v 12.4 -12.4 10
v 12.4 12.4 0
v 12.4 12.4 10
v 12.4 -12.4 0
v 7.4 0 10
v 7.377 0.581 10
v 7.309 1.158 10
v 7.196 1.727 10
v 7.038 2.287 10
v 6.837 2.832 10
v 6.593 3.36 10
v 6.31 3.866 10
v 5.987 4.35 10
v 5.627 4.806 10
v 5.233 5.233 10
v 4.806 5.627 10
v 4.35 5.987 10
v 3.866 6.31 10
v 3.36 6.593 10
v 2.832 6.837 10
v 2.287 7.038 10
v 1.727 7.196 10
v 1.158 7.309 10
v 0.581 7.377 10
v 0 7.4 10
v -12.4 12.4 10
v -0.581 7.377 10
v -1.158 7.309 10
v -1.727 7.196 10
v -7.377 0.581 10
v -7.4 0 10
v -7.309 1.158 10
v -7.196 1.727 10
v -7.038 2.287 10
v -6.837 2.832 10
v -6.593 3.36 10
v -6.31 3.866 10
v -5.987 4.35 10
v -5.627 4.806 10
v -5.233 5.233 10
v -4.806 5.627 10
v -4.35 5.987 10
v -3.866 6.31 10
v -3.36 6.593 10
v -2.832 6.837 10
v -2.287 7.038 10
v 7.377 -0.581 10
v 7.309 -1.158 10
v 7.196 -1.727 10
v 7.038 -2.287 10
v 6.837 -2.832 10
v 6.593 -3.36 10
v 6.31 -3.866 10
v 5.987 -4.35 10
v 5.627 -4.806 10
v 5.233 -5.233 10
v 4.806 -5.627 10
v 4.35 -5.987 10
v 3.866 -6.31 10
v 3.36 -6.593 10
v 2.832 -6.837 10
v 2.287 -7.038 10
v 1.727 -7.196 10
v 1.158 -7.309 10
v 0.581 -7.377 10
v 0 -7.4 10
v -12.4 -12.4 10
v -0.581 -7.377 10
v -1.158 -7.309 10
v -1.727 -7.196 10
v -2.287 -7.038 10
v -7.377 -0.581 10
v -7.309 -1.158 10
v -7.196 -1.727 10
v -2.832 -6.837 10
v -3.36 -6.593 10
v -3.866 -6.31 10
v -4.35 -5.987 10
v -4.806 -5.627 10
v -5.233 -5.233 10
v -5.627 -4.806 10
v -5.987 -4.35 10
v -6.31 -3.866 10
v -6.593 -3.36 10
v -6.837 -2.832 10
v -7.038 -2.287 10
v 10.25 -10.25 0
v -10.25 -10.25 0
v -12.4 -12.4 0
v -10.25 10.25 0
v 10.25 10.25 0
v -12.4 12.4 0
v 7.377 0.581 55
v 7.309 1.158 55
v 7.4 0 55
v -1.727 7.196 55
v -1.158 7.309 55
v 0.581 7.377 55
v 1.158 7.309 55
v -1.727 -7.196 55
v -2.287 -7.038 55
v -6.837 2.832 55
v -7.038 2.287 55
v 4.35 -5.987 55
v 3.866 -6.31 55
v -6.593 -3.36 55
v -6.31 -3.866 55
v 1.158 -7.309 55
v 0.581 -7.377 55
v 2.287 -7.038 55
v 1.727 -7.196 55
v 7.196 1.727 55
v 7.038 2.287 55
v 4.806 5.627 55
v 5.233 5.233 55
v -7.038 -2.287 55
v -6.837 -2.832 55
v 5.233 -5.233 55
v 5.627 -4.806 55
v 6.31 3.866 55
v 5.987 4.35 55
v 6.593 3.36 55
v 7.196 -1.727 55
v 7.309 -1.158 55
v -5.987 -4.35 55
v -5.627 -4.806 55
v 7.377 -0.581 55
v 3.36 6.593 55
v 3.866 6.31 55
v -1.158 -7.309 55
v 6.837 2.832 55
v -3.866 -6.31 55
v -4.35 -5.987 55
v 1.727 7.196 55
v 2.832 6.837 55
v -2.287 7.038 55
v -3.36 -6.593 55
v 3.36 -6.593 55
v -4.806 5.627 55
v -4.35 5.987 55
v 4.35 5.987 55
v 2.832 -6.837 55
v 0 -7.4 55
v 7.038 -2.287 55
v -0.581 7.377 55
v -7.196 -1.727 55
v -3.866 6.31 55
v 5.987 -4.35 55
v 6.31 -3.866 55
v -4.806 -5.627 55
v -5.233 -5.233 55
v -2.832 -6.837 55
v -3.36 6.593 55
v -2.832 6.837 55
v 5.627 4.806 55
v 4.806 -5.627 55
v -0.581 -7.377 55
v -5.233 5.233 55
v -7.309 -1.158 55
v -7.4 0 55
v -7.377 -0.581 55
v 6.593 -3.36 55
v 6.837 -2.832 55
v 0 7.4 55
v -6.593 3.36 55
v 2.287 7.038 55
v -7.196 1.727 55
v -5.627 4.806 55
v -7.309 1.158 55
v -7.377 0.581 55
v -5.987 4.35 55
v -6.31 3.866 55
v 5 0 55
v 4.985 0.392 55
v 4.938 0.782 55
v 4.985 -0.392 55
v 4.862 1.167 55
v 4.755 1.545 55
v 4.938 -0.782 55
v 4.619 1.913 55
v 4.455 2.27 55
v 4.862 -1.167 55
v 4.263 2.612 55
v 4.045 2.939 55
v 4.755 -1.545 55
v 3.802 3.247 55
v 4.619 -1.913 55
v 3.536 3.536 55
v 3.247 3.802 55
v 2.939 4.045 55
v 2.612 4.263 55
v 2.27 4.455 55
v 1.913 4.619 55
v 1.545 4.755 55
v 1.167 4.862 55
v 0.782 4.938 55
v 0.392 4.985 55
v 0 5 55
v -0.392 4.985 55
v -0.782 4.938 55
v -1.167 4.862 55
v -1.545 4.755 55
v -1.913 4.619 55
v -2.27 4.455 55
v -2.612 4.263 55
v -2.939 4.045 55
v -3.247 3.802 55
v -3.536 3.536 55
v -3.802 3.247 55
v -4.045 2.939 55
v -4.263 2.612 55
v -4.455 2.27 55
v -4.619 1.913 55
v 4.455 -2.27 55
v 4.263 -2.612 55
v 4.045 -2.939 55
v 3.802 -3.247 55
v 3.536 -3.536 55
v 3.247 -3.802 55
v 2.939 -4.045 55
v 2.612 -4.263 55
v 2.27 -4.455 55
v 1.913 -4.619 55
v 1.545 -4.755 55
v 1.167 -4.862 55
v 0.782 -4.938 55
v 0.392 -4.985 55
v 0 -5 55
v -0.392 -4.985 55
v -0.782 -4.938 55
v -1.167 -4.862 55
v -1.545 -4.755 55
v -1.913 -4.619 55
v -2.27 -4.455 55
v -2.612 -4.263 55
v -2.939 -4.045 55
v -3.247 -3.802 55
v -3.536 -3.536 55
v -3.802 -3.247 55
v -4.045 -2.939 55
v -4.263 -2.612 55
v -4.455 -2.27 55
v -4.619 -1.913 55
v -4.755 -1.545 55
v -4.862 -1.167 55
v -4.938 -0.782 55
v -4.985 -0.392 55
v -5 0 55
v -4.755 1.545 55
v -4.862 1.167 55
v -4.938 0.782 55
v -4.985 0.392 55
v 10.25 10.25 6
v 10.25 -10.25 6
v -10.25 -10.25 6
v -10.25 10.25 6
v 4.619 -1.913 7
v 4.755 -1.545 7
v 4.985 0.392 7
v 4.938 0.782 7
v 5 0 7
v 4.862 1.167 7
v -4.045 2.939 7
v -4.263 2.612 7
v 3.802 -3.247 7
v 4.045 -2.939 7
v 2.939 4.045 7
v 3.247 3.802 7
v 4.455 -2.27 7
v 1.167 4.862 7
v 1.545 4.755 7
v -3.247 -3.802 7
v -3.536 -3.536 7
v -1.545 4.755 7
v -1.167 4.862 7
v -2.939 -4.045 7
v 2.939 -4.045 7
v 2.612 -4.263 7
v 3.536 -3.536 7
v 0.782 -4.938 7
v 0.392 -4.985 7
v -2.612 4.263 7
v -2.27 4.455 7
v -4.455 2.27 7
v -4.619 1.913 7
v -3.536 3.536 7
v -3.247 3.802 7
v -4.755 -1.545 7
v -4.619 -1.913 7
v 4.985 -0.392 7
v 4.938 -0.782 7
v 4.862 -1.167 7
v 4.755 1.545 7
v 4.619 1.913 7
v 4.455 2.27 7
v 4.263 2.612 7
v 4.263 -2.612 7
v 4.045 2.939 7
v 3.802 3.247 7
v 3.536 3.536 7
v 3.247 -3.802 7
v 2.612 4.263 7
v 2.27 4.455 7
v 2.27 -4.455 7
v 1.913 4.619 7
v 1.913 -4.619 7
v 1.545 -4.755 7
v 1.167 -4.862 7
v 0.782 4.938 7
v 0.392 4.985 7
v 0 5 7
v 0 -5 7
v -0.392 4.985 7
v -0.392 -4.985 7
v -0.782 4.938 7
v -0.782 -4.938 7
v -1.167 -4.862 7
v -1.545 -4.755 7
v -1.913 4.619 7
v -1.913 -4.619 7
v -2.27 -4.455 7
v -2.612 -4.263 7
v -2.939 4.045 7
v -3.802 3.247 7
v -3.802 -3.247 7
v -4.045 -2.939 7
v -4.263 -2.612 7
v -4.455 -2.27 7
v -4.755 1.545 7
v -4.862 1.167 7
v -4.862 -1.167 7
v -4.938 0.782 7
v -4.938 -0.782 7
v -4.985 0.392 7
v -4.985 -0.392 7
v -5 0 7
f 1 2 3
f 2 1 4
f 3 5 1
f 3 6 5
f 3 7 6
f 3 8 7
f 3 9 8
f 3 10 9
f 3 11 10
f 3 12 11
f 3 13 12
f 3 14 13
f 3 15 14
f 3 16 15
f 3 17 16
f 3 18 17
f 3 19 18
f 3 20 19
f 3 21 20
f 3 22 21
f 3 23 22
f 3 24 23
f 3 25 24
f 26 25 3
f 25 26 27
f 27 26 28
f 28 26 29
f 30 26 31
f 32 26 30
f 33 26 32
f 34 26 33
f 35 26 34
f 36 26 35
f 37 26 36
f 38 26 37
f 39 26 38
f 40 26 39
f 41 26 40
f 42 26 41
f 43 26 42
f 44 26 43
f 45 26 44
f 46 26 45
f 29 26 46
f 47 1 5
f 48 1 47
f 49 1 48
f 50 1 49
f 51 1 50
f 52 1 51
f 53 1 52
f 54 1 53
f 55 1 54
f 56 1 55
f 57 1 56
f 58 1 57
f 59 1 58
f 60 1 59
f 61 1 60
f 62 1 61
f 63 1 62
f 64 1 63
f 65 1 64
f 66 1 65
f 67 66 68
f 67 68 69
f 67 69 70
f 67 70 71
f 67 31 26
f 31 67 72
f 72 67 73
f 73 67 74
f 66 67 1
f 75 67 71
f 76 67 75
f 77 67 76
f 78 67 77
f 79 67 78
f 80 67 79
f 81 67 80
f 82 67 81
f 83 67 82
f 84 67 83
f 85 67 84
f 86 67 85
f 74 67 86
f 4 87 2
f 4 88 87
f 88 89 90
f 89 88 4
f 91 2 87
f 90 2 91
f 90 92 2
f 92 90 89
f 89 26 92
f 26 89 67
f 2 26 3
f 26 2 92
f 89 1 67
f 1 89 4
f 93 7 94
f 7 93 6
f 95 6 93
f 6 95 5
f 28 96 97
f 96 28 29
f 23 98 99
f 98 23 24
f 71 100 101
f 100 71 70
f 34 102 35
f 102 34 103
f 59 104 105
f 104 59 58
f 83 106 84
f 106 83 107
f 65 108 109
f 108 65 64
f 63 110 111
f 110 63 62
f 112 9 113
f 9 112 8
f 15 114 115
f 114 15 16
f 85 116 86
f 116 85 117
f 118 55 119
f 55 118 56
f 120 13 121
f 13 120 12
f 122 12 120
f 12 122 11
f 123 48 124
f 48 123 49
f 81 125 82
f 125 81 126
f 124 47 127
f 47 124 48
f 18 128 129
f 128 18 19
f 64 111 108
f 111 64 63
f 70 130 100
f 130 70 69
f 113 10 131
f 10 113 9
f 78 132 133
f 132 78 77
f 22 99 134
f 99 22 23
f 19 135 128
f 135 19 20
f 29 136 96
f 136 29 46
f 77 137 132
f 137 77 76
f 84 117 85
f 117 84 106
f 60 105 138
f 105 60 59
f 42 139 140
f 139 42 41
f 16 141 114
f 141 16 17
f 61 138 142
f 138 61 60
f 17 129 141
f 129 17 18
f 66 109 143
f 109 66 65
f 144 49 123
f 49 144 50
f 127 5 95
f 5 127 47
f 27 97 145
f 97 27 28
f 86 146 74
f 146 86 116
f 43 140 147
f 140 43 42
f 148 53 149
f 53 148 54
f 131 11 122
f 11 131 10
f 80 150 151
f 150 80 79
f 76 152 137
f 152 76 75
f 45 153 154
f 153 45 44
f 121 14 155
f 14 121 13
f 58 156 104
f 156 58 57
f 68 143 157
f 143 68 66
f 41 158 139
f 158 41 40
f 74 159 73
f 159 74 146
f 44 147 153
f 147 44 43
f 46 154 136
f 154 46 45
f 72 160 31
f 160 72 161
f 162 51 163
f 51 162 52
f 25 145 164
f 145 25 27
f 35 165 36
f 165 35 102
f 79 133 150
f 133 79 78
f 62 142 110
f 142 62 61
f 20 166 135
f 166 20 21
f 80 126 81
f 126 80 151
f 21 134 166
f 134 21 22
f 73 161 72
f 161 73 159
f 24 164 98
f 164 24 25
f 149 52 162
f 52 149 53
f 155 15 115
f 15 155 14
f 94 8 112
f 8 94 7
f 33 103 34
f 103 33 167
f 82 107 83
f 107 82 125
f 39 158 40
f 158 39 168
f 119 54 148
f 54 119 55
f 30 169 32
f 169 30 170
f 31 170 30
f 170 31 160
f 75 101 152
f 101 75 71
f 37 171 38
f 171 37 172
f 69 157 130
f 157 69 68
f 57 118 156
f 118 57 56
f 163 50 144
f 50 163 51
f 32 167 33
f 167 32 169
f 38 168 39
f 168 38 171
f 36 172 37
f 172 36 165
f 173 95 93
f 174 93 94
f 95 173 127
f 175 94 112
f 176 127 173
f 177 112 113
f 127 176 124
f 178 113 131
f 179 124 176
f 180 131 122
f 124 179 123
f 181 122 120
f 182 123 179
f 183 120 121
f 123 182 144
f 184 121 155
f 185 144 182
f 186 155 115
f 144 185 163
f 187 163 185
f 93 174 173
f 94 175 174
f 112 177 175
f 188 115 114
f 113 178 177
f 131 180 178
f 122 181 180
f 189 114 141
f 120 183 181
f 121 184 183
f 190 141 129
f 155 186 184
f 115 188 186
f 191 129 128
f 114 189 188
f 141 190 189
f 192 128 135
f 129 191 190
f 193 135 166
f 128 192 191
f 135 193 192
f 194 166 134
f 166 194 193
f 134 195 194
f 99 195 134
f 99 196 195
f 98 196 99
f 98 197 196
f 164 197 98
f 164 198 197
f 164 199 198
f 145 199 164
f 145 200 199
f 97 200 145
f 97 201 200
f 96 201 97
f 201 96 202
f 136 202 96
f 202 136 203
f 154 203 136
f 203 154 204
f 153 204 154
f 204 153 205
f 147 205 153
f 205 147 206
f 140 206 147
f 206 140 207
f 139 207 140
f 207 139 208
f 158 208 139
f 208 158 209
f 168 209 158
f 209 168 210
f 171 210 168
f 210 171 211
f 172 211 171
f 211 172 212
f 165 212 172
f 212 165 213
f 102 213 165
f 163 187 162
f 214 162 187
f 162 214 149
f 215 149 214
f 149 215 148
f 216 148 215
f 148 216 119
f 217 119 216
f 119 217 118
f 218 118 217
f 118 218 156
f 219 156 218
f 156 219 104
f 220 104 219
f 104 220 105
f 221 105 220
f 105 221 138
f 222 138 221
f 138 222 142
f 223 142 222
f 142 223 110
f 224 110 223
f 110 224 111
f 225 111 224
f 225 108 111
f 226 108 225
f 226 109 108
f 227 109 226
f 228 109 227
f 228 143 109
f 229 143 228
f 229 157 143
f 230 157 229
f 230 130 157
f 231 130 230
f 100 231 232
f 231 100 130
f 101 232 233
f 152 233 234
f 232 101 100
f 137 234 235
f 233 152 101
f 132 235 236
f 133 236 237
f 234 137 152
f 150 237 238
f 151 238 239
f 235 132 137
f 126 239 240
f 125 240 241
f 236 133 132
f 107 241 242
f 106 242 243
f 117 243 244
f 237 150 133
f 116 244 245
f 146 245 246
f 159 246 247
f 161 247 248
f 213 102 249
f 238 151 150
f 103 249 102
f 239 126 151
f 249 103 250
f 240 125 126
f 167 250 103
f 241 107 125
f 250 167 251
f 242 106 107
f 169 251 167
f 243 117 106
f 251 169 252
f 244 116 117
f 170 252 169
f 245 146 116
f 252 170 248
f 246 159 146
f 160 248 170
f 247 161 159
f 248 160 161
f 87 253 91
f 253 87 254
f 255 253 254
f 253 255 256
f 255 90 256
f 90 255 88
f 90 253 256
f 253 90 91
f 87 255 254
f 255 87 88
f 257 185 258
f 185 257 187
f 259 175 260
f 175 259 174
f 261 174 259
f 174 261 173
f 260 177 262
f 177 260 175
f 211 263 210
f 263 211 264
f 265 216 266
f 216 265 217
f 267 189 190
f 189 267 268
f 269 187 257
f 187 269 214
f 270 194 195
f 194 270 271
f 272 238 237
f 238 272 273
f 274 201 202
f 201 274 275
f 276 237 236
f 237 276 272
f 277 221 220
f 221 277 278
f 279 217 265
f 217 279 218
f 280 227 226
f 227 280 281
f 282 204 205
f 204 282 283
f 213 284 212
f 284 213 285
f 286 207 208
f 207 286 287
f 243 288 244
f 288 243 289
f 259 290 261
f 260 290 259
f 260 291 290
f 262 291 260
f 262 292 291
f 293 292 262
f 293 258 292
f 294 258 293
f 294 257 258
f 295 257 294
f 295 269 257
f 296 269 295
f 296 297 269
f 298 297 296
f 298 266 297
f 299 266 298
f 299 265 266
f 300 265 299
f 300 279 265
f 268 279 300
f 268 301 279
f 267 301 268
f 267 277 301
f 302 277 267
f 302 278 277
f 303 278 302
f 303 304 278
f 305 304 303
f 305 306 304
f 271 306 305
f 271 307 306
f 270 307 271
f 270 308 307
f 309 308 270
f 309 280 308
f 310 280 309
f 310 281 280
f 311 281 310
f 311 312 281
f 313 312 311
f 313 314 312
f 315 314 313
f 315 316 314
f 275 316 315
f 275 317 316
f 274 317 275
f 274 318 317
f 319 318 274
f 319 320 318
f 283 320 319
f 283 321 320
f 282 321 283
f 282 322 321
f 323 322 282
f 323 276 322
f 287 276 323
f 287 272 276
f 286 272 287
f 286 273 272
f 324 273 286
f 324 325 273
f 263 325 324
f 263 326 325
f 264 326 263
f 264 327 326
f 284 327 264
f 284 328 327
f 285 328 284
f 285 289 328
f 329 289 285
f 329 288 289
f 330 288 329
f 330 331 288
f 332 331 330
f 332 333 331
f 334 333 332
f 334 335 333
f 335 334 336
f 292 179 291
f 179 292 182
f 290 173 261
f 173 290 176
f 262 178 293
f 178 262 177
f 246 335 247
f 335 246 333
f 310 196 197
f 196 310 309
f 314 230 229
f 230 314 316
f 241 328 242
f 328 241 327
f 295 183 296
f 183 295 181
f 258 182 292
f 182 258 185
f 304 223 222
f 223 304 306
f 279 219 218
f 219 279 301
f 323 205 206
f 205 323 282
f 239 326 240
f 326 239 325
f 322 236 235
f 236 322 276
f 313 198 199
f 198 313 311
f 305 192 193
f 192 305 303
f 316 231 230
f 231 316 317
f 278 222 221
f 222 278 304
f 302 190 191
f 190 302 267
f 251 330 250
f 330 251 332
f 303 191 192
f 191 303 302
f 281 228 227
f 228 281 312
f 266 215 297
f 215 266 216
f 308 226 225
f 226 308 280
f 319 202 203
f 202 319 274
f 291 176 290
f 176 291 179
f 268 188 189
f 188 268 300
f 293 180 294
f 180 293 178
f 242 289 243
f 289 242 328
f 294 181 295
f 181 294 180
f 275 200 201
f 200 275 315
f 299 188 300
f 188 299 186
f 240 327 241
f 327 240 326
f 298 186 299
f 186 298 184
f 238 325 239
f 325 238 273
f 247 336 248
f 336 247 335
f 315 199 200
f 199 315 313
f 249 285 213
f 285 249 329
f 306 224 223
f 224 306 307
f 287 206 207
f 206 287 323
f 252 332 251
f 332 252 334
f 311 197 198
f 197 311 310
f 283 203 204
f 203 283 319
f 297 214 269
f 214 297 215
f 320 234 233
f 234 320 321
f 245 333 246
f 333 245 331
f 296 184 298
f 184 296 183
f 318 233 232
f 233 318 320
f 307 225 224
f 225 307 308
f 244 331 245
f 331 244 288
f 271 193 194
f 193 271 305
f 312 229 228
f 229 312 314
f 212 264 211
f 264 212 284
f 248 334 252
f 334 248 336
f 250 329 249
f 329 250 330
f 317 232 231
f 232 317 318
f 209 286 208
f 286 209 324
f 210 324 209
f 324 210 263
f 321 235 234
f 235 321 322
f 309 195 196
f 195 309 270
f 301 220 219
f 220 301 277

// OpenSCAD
// Light hood. Measure the actual OPT101 breakout before printing.
board_w = 20.0;
board_h = 20.0;
board_t = 2.0;
tube_inner_d = 10.0;
tube_length = 45.0;
wall = 2.4;
clearance = 0.5;
$fn = 80;

difference() {
  union() {
    translate([-(board_w+2*wall)/2,-(board_h+2*wall)/2,0])
      cube([board_w+2*wall,board_h+2*wall,board_t+8]);
    translate([0,0,board_t+8]) cylinder(h=tube_length,d=tube_inner_d+2*wall);
  }
  translate([-(board_w+clearance)/2,-(board_h+clearance)/2,-1])
    cube([board_w+clearance,board_h+clearance,board_t+5]);
  translate([0,0,board_t+5]) cylinder(h=tube_length+5,d=tube_inner_d);
}
